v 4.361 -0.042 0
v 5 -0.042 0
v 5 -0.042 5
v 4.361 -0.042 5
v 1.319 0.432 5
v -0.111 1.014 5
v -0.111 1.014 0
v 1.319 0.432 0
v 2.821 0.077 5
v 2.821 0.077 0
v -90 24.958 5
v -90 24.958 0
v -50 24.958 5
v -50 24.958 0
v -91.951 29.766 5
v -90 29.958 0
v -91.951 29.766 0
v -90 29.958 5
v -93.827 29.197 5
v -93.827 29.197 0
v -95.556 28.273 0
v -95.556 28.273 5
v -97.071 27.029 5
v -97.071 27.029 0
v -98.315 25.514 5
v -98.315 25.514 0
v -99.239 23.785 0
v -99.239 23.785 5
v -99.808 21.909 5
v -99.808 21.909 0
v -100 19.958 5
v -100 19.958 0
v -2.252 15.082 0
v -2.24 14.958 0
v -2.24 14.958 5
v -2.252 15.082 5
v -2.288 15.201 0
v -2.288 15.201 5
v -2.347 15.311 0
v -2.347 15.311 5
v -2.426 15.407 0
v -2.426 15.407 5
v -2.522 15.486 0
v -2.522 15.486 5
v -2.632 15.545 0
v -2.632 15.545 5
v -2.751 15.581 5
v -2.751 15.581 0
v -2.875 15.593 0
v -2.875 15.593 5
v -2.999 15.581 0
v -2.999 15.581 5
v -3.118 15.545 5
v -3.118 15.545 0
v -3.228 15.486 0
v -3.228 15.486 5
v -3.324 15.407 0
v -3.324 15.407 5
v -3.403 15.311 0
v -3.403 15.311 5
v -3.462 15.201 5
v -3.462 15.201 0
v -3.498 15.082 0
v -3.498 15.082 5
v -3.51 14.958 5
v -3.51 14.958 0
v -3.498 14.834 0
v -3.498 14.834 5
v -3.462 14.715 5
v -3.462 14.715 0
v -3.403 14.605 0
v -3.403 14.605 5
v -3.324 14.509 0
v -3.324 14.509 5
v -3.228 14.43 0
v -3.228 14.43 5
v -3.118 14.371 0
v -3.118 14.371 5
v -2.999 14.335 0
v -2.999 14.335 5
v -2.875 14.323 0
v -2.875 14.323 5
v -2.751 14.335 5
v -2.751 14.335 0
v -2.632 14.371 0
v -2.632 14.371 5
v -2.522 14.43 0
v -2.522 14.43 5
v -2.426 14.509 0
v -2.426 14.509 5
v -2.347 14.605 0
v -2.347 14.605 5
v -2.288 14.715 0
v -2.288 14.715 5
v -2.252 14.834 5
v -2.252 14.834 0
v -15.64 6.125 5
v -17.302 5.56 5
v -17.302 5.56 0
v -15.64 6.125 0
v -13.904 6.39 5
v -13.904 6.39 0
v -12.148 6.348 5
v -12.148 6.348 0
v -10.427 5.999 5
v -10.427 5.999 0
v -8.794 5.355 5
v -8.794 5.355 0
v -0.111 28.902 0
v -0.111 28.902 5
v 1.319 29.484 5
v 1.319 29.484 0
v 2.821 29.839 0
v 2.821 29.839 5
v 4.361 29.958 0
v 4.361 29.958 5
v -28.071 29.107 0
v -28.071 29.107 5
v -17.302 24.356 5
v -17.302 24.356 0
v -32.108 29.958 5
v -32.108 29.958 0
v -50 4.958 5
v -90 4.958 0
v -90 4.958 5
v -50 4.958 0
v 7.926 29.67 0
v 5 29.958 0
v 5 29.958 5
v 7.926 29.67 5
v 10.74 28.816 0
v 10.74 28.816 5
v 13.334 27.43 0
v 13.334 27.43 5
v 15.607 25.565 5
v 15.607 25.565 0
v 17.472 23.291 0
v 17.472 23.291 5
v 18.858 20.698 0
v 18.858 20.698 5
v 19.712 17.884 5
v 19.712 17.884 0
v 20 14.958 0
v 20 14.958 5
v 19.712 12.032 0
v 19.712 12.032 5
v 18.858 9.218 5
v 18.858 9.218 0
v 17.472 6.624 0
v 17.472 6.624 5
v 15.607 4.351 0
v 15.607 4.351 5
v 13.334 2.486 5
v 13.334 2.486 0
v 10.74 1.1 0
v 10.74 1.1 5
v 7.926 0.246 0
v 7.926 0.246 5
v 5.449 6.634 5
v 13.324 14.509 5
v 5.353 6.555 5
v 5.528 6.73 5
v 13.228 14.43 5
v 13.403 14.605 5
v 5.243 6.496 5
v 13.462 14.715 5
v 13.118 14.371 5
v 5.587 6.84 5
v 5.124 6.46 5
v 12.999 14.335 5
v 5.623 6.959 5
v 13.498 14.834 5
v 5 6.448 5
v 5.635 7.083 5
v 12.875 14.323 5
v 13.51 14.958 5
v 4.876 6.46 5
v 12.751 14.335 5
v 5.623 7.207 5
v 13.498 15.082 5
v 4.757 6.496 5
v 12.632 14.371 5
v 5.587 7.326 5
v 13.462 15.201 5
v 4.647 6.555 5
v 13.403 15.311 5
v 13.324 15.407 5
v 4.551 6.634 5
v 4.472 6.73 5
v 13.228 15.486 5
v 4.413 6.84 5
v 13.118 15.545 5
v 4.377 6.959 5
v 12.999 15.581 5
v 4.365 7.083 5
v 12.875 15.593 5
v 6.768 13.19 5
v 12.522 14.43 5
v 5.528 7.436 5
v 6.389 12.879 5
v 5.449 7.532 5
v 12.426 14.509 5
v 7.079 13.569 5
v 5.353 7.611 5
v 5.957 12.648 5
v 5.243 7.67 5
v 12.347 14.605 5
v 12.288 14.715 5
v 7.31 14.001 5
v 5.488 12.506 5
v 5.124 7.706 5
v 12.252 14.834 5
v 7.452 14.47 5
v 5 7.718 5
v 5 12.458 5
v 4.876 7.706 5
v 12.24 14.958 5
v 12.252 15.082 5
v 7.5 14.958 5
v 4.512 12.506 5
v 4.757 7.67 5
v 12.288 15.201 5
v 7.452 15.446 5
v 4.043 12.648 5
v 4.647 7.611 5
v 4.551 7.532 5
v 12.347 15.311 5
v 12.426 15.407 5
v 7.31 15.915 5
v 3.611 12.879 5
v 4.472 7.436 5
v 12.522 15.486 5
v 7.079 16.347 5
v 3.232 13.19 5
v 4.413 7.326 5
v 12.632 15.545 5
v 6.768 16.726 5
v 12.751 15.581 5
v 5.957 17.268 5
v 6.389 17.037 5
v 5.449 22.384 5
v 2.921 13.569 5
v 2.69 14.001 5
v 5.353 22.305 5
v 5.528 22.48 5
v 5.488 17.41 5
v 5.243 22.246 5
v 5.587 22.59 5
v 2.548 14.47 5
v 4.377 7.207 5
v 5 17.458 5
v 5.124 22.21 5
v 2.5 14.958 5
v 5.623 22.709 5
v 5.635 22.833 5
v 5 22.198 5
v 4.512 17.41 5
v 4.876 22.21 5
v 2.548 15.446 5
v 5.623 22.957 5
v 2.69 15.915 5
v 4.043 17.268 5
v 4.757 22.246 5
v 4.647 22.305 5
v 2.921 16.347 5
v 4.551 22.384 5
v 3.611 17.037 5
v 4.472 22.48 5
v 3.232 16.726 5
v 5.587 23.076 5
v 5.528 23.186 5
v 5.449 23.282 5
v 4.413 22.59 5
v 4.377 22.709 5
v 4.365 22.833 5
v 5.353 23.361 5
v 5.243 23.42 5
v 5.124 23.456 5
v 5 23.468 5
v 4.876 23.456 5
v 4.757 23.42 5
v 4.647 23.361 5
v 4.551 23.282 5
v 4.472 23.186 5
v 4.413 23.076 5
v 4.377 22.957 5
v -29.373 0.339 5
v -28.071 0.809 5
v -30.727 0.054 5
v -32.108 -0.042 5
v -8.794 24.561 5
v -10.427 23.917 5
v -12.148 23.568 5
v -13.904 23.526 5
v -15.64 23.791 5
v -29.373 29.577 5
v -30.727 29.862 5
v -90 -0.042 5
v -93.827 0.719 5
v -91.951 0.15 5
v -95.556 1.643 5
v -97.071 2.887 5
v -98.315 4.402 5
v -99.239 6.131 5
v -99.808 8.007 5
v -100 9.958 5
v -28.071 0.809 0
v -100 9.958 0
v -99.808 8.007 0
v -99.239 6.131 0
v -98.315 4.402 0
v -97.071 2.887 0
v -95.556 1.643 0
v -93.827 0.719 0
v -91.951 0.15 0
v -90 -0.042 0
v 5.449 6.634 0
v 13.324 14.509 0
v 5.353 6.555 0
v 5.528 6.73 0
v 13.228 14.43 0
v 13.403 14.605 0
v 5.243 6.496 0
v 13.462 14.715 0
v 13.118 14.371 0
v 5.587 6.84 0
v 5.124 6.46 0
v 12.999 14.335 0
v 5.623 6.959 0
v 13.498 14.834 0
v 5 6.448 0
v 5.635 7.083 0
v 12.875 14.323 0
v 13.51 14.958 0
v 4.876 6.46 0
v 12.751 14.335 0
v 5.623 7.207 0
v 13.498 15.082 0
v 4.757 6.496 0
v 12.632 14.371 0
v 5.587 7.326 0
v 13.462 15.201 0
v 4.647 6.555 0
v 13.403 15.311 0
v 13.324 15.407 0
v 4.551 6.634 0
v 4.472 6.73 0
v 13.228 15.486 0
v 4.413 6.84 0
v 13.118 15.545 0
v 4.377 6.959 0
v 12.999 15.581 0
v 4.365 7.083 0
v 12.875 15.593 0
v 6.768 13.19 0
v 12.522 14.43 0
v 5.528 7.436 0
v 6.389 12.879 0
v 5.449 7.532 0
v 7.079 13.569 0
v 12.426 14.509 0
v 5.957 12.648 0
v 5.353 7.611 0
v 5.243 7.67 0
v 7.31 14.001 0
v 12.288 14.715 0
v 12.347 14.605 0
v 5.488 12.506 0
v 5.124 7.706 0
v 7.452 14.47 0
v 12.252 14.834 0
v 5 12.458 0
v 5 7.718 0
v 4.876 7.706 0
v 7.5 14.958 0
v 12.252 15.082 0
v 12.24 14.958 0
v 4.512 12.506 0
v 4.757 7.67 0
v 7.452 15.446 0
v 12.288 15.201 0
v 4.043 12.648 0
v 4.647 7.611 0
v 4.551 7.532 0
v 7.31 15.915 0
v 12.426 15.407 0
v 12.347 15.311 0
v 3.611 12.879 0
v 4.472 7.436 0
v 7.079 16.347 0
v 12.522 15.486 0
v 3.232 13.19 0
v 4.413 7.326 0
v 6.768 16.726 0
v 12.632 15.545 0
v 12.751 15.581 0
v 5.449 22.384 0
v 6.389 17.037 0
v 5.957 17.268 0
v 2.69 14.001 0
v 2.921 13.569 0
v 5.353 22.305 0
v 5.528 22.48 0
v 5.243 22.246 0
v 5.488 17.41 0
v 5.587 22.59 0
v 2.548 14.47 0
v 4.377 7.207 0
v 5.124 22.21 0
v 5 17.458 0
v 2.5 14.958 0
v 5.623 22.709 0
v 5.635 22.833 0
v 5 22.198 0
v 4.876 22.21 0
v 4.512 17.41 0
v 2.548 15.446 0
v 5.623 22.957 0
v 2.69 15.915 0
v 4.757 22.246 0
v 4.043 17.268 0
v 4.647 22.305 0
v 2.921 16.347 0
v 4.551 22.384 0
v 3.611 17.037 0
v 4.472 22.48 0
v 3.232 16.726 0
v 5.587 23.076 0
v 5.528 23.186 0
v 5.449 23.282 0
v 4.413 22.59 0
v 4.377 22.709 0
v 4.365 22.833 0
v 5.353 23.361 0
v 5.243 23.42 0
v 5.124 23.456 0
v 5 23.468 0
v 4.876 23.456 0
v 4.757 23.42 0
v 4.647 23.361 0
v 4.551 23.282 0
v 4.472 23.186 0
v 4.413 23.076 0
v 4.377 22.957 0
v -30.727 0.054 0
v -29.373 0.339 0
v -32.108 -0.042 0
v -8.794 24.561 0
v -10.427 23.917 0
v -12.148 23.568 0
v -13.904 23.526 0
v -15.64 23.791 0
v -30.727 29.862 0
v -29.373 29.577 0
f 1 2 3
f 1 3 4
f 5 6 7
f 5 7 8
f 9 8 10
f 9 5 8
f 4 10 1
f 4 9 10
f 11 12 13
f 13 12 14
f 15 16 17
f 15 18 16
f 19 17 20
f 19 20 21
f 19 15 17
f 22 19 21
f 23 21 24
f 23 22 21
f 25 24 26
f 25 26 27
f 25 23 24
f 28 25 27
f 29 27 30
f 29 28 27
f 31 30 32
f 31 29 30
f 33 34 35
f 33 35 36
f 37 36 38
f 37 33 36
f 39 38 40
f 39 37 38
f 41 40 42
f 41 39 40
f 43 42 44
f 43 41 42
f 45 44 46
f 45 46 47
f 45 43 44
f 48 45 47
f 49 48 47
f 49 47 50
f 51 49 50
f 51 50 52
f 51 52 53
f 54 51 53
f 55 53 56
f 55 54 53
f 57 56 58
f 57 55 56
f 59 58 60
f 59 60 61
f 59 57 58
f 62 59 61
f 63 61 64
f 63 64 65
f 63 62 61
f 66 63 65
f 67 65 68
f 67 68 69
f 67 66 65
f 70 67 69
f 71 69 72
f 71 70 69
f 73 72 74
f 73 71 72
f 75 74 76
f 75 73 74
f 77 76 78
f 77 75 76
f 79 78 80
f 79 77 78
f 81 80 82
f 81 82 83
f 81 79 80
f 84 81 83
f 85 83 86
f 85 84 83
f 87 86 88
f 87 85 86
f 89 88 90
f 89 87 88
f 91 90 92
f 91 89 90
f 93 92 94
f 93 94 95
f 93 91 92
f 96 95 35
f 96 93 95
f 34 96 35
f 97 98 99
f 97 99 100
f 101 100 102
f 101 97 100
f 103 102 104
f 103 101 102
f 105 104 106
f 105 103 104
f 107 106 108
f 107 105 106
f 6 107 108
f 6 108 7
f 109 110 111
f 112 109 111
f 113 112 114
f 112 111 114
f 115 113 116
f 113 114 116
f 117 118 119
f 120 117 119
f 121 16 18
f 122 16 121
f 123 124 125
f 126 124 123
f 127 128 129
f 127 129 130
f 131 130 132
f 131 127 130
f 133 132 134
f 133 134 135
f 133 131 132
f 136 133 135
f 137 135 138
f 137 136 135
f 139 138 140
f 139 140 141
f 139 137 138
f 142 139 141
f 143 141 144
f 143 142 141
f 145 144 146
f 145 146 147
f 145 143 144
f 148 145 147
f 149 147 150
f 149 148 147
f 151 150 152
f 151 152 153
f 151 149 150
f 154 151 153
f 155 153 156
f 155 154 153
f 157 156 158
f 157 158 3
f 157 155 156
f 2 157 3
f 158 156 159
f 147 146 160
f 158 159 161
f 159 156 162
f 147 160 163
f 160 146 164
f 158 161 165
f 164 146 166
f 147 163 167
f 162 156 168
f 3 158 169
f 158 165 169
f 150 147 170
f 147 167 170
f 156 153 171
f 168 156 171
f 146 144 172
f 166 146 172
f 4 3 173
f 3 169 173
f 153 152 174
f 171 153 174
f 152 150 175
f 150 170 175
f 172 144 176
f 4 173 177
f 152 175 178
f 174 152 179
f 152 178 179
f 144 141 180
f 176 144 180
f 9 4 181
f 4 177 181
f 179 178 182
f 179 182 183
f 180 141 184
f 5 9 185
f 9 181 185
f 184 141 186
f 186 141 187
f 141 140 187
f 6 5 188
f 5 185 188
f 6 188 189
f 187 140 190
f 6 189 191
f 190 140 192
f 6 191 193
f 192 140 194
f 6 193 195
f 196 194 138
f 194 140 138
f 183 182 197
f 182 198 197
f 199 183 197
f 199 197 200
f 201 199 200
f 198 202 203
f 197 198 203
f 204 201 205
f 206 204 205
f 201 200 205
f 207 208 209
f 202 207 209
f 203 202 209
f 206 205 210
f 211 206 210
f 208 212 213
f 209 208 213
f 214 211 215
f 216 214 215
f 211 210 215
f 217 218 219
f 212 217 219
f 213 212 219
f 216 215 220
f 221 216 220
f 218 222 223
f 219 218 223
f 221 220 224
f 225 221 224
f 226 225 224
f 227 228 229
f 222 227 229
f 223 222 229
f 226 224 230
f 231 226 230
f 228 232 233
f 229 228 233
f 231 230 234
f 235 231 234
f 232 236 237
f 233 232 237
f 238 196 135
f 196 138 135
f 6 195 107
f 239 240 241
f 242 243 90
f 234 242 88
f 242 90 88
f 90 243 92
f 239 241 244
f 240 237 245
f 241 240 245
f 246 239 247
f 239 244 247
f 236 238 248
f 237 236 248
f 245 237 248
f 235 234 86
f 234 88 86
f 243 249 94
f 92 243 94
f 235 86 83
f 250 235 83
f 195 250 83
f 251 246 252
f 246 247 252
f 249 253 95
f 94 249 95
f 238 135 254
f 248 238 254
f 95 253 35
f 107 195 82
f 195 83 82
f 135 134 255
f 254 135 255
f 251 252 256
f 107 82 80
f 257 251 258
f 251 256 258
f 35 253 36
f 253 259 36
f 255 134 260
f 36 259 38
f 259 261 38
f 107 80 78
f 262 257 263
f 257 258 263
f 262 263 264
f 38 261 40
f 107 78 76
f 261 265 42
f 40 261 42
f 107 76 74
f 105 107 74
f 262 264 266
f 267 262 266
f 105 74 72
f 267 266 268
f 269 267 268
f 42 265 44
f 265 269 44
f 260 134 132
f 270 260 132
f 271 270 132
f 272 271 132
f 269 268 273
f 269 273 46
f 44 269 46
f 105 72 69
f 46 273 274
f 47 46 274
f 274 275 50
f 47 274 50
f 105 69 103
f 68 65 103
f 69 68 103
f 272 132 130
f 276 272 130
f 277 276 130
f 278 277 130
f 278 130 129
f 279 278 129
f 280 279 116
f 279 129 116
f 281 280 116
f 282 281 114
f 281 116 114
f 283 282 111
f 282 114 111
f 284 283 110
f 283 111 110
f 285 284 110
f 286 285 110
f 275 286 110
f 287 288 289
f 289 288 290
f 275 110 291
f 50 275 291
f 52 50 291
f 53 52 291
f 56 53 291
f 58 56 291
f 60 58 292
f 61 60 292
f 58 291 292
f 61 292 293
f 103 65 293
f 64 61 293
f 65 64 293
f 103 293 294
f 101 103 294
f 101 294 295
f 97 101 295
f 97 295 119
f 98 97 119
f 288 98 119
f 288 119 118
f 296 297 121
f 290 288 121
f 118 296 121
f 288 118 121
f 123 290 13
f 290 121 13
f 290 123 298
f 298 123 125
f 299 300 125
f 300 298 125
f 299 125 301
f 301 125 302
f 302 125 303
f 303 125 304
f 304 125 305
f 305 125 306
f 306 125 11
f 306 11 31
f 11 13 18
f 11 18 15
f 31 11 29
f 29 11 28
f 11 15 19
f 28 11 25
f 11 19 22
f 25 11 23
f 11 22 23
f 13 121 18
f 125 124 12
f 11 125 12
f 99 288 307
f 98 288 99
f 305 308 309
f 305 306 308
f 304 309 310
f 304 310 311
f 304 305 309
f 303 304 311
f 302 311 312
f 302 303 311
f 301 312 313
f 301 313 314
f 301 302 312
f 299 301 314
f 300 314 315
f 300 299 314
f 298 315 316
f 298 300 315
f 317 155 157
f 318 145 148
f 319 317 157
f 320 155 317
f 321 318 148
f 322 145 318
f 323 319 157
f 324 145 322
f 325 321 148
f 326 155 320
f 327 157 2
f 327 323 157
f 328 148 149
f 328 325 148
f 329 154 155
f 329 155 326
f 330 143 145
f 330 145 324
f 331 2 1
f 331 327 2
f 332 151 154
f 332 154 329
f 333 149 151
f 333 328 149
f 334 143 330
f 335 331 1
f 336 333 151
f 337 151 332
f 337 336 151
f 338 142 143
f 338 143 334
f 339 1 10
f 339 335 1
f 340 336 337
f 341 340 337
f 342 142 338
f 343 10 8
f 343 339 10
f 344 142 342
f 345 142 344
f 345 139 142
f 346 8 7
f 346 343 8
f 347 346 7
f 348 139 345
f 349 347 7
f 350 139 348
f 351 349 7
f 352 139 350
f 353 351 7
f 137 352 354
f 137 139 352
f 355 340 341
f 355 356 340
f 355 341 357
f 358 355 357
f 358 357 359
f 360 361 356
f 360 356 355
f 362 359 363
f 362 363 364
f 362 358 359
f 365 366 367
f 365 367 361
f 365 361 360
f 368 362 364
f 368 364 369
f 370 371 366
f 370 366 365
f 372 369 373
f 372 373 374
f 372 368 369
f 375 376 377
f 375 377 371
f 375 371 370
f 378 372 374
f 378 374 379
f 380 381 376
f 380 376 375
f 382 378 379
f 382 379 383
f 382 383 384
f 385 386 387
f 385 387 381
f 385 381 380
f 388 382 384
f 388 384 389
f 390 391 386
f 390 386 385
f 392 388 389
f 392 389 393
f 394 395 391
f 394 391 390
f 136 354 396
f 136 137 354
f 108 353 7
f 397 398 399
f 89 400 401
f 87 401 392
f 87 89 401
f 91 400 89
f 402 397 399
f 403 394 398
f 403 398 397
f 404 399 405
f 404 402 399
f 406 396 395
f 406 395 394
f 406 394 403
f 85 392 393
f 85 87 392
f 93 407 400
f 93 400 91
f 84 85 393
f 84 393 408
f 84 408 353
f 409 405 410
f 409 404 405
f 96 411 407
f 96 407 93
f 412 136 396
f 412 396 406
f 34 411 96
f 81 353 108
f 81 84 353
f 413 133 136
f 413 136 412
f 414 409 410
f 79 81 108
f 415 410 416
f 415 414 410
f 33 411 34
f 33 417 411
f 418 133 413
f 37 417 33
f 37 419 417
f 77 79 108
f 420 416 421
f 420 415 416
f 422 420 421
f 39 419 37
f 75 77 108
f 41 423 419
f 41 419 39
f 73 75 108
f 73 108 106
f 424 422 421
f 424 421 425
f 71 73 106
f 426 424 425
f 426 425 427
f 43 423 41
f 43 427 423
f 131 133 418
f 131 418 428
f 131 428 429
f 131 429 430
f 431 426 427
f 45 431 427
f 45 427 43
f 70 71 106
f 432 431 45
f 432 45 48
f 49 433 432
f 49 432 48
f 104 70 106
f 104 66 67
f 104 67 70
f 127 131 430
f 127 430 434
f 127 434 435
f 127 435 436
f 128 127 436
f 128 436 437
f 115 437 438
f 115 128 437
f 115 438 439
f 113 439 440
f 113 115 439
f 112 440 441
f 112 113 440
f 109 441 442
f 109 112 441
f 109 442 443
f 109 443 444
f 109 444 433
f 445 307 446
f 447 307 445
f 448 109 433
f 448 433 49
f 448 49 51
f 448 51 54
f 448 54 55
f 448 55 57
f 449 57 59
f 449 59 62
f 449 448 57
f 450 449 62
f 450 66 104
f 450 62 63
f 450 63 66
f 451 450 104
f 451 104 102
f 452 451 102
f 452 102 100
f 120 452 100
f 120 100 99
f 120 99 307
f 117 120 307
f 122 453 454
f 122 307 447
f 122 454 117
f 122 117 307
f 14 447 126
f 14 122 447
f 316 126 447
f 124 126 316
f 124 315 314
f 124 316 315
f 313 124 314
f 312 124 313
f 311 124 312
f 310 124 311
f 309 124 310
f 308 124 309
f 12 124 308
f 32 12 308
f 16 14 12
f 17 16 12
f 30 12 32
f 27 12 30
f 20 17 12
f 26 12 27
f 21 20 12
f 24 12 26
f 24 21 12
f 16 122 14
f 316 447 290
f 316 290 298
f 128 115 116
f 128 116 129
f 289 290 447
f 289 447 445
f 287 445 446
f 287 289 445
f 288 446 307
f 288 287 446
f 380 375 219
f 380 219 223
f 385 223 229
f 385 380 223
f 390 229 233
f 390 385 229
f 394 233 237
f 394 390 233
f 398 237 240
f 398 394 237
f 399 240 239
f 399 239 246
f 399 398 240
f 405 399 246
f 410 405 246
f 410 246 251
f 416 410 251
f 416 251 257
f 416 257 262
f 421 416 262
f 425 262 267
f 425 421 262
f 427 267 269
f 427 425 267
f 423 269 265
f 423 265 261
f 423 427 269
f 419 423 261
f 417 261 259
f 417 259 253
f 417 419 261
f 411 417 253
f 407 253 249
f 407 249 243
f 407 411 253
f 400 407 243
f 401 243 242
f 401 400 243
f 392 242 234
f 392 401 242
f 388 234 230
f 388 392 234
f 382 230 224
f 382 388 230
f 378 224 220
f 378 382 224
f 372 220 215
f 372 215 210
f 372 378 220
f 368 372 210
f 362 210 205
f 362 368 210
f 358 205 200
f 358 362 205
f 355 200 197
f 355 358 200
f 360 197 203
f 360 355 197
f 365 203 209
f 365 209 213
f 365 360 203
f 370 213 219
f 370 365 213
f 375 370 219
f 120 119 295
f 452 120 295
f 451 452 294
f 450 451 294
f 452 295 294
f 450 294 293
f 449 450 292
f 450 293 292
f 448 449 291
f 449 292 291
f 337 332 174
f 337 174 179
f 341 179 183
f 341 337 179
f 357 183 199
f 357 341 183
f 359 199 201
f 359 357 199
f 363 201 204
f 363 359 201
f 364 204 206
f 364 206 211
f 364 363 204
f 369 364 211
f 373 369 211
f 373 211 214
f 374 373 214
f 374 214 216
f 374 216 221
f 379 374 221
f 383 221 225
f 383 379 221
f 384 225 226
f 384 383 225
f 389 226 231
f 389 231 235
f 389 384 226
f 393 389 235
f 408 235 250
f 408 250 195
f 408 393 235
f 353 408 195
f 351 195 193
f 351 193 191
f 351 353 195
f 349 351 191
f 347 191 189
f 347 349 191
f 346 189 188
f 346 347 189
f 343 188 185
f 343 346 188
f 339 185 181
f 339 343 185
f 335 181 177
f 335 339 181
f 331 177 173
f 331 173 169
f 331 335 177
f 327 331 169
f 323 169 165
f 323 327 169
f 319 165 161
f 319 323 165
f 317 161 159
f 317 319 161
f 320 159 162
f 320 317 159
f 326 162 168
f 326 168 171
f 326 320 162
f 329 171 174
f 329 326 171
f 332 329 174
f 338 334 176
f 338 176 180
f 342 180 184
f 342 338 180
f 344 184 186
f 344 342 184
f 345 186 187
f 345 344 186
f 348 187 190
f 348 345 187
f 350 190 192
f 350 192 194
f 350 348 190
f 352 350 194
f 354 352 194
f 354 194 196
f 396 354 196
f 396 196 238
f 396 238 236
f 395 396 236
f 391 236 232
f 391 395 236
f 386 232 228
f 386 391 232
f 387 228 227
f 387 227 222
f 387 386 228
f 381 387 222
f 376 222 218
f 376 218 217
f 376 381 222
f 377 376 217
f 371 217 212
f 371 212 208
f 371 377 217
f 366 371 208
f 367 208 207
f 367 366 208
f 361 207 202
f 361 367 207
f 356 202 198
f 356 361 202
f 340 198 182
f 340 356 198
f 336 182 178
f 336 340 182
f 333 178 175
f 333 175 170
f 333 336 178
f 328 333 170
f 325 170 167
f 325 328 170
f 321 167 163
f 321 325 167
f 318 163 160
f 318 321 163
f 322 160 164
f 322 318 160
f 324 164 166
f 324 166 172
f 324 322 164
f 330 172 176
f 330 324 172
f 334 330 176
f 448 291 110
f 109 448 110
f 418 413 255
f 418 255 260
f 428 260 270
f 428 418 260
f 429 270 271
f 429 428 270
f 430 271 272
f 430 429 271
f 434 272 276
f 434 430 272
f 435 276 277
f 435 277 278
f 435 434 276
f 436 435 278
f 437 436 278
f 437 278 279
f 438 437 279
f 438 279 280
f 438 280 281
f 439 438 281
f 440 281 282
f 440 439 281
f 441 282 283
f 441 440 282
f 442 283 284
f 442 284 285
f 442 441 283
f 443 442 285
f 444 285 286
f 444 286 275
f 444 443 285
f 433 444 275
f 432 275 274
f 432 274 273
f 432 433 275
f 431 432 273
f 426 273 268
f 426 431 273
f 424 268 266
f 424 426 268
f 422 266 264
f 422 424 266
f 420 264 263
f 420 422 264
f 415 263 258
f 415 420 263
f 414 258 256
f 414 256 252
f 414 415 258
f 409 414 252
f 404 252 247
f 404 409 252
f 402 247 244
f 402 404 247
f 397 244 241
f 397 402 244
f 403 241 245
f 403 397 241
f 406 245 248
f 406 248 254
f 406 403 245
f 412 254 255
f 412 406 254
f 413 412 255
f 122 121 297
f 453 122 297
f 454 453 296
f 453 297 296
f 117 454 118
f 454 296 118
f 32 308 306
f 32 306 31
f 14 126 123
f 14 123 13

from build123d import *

# Parameters (mm, degrees)
SKETCH1_R           = 2.5
SKETCH1_R_2         = 0.635
SKETCH1_W           = 40
SKETCH1_H           = 20
BOSS_EXTRUDE1_DEPTH = 5
CUT_EXTRUDE1_DEPTH  = 5
FILLET1_R           = 10
FILLET2_R           = 10


with BuildPart() as part:
    # Sketch1 → Boss-Extrude1 (new body)
    with BuildSketch(Plane.XY):
        with BuildLine():
            Line((5, -0.042056462), (-100, -0.042056462))
            Line((-100, -0.042056462), (-100, 29.957943538))
            Line((-100, 29.957943538), (5, 29.957943538))
            ThreePointArc((5, 29.957943538), (20, 14.957943538), (5, -0.042056462))
        make_face()
        with Locations((5, 14.957943538)):
            Circle(SKETCH1_R, mode=Mode.SUBTRACT)
        with Locations((5, 22.832946838)):
            Circle(SKETCH1_R_2, mode=Mode.SUBTRACT)
        with Locations((-2.8750033, 14.957943538)):
            Circle(SKETCH1_R_2, mode=Mode.SUBTRACT)
        with Locations((12.8750033, 14.957943538)):
            Circle(SKETCH1_R_2, mode=Mode.SUBTRACT)
        with Locations((5, 7.082940238)):
            Circle(SKETCH1_R_2, mode=Mode.SUBTRACT)
        with Locations((-70, 14.957943538)):
            Rectangle(SKETCH1_W, SKETCH1_H, mode=Mode.SUBTRACT)
    extrude(amount=BOSS_EXTRUDE1_DEPTH)

    # Sketch2 → Cut-Extrude1 (cut)
    with BuildSketch(Plane.XY.offset(5)):
        with BuildLine():
            Line((-28.071470169, 29.107121554), (-17.302448086, 24.356082399))
            ThreePointArc((-17.302448086, 24.356082399), (-13.025291719, 23.508158967), (-8.793910065, 24.560988505))
            Line((-8.793910065, 24.560988505), (-0.11145618, 28.902215448))
            ThreePointArc((-0.11145618, 28.902215448), (2.06315057, 29.690433433), (4.360679775, 29.957943538))
            Line((4.360679775, 29.957943538), (-32.107872235, 29.957943538))
            ThreePointArc((-32.107872235, 29.957943538), (-30.04532286, 29.742926424), (-28.071470169, 29.107121554))
        make_face()
        with BuildLine():
            Line((-28.071470169, 0.808765522), (-17.302448086, 5.559804676))
            ThreePointArc((-17.302448086, 5.559804676), (-13.025291719, 6.407728109), (-8.793910065, 5.354898571))
            Line((-8.793910065, 5.354898571), (-0.11145618, 1.013671628))
            ThreePointArc((-0.11145618, 1.013671628), (2.06315057, 0.225453643), (4.360679775, -0.042056462))
            Line((4.360679775, -0.042056462), (-32.107872235, -0.042056462))
            ThreePointArc((-32.107872235, -0.042056462), (-30.04532286, 0.172960652), (-28.071470169, 0.808765522))
        make_face()
    extrude(amount=-CUT_EXTRUDE1_DEPTH, mode=Mode.SUBTRACT)

    # Fillet1
    fillet1_edges = [part.edges().sort_by_distance(p)[0] for p in [
        (-100, 29.957943538, 2.5),
    ]]
    fillet(fillet1_edges, radius=FILLET1_R)

    # Fillet2
    fillet2_edges = [part.edges().sort_by_distance(p)[0] for p in [
        (-100, -0.042056462, 2.5),
    ]]
    fillet(fillet2_edges, radius=FILLET2_R)


solid = part.part
